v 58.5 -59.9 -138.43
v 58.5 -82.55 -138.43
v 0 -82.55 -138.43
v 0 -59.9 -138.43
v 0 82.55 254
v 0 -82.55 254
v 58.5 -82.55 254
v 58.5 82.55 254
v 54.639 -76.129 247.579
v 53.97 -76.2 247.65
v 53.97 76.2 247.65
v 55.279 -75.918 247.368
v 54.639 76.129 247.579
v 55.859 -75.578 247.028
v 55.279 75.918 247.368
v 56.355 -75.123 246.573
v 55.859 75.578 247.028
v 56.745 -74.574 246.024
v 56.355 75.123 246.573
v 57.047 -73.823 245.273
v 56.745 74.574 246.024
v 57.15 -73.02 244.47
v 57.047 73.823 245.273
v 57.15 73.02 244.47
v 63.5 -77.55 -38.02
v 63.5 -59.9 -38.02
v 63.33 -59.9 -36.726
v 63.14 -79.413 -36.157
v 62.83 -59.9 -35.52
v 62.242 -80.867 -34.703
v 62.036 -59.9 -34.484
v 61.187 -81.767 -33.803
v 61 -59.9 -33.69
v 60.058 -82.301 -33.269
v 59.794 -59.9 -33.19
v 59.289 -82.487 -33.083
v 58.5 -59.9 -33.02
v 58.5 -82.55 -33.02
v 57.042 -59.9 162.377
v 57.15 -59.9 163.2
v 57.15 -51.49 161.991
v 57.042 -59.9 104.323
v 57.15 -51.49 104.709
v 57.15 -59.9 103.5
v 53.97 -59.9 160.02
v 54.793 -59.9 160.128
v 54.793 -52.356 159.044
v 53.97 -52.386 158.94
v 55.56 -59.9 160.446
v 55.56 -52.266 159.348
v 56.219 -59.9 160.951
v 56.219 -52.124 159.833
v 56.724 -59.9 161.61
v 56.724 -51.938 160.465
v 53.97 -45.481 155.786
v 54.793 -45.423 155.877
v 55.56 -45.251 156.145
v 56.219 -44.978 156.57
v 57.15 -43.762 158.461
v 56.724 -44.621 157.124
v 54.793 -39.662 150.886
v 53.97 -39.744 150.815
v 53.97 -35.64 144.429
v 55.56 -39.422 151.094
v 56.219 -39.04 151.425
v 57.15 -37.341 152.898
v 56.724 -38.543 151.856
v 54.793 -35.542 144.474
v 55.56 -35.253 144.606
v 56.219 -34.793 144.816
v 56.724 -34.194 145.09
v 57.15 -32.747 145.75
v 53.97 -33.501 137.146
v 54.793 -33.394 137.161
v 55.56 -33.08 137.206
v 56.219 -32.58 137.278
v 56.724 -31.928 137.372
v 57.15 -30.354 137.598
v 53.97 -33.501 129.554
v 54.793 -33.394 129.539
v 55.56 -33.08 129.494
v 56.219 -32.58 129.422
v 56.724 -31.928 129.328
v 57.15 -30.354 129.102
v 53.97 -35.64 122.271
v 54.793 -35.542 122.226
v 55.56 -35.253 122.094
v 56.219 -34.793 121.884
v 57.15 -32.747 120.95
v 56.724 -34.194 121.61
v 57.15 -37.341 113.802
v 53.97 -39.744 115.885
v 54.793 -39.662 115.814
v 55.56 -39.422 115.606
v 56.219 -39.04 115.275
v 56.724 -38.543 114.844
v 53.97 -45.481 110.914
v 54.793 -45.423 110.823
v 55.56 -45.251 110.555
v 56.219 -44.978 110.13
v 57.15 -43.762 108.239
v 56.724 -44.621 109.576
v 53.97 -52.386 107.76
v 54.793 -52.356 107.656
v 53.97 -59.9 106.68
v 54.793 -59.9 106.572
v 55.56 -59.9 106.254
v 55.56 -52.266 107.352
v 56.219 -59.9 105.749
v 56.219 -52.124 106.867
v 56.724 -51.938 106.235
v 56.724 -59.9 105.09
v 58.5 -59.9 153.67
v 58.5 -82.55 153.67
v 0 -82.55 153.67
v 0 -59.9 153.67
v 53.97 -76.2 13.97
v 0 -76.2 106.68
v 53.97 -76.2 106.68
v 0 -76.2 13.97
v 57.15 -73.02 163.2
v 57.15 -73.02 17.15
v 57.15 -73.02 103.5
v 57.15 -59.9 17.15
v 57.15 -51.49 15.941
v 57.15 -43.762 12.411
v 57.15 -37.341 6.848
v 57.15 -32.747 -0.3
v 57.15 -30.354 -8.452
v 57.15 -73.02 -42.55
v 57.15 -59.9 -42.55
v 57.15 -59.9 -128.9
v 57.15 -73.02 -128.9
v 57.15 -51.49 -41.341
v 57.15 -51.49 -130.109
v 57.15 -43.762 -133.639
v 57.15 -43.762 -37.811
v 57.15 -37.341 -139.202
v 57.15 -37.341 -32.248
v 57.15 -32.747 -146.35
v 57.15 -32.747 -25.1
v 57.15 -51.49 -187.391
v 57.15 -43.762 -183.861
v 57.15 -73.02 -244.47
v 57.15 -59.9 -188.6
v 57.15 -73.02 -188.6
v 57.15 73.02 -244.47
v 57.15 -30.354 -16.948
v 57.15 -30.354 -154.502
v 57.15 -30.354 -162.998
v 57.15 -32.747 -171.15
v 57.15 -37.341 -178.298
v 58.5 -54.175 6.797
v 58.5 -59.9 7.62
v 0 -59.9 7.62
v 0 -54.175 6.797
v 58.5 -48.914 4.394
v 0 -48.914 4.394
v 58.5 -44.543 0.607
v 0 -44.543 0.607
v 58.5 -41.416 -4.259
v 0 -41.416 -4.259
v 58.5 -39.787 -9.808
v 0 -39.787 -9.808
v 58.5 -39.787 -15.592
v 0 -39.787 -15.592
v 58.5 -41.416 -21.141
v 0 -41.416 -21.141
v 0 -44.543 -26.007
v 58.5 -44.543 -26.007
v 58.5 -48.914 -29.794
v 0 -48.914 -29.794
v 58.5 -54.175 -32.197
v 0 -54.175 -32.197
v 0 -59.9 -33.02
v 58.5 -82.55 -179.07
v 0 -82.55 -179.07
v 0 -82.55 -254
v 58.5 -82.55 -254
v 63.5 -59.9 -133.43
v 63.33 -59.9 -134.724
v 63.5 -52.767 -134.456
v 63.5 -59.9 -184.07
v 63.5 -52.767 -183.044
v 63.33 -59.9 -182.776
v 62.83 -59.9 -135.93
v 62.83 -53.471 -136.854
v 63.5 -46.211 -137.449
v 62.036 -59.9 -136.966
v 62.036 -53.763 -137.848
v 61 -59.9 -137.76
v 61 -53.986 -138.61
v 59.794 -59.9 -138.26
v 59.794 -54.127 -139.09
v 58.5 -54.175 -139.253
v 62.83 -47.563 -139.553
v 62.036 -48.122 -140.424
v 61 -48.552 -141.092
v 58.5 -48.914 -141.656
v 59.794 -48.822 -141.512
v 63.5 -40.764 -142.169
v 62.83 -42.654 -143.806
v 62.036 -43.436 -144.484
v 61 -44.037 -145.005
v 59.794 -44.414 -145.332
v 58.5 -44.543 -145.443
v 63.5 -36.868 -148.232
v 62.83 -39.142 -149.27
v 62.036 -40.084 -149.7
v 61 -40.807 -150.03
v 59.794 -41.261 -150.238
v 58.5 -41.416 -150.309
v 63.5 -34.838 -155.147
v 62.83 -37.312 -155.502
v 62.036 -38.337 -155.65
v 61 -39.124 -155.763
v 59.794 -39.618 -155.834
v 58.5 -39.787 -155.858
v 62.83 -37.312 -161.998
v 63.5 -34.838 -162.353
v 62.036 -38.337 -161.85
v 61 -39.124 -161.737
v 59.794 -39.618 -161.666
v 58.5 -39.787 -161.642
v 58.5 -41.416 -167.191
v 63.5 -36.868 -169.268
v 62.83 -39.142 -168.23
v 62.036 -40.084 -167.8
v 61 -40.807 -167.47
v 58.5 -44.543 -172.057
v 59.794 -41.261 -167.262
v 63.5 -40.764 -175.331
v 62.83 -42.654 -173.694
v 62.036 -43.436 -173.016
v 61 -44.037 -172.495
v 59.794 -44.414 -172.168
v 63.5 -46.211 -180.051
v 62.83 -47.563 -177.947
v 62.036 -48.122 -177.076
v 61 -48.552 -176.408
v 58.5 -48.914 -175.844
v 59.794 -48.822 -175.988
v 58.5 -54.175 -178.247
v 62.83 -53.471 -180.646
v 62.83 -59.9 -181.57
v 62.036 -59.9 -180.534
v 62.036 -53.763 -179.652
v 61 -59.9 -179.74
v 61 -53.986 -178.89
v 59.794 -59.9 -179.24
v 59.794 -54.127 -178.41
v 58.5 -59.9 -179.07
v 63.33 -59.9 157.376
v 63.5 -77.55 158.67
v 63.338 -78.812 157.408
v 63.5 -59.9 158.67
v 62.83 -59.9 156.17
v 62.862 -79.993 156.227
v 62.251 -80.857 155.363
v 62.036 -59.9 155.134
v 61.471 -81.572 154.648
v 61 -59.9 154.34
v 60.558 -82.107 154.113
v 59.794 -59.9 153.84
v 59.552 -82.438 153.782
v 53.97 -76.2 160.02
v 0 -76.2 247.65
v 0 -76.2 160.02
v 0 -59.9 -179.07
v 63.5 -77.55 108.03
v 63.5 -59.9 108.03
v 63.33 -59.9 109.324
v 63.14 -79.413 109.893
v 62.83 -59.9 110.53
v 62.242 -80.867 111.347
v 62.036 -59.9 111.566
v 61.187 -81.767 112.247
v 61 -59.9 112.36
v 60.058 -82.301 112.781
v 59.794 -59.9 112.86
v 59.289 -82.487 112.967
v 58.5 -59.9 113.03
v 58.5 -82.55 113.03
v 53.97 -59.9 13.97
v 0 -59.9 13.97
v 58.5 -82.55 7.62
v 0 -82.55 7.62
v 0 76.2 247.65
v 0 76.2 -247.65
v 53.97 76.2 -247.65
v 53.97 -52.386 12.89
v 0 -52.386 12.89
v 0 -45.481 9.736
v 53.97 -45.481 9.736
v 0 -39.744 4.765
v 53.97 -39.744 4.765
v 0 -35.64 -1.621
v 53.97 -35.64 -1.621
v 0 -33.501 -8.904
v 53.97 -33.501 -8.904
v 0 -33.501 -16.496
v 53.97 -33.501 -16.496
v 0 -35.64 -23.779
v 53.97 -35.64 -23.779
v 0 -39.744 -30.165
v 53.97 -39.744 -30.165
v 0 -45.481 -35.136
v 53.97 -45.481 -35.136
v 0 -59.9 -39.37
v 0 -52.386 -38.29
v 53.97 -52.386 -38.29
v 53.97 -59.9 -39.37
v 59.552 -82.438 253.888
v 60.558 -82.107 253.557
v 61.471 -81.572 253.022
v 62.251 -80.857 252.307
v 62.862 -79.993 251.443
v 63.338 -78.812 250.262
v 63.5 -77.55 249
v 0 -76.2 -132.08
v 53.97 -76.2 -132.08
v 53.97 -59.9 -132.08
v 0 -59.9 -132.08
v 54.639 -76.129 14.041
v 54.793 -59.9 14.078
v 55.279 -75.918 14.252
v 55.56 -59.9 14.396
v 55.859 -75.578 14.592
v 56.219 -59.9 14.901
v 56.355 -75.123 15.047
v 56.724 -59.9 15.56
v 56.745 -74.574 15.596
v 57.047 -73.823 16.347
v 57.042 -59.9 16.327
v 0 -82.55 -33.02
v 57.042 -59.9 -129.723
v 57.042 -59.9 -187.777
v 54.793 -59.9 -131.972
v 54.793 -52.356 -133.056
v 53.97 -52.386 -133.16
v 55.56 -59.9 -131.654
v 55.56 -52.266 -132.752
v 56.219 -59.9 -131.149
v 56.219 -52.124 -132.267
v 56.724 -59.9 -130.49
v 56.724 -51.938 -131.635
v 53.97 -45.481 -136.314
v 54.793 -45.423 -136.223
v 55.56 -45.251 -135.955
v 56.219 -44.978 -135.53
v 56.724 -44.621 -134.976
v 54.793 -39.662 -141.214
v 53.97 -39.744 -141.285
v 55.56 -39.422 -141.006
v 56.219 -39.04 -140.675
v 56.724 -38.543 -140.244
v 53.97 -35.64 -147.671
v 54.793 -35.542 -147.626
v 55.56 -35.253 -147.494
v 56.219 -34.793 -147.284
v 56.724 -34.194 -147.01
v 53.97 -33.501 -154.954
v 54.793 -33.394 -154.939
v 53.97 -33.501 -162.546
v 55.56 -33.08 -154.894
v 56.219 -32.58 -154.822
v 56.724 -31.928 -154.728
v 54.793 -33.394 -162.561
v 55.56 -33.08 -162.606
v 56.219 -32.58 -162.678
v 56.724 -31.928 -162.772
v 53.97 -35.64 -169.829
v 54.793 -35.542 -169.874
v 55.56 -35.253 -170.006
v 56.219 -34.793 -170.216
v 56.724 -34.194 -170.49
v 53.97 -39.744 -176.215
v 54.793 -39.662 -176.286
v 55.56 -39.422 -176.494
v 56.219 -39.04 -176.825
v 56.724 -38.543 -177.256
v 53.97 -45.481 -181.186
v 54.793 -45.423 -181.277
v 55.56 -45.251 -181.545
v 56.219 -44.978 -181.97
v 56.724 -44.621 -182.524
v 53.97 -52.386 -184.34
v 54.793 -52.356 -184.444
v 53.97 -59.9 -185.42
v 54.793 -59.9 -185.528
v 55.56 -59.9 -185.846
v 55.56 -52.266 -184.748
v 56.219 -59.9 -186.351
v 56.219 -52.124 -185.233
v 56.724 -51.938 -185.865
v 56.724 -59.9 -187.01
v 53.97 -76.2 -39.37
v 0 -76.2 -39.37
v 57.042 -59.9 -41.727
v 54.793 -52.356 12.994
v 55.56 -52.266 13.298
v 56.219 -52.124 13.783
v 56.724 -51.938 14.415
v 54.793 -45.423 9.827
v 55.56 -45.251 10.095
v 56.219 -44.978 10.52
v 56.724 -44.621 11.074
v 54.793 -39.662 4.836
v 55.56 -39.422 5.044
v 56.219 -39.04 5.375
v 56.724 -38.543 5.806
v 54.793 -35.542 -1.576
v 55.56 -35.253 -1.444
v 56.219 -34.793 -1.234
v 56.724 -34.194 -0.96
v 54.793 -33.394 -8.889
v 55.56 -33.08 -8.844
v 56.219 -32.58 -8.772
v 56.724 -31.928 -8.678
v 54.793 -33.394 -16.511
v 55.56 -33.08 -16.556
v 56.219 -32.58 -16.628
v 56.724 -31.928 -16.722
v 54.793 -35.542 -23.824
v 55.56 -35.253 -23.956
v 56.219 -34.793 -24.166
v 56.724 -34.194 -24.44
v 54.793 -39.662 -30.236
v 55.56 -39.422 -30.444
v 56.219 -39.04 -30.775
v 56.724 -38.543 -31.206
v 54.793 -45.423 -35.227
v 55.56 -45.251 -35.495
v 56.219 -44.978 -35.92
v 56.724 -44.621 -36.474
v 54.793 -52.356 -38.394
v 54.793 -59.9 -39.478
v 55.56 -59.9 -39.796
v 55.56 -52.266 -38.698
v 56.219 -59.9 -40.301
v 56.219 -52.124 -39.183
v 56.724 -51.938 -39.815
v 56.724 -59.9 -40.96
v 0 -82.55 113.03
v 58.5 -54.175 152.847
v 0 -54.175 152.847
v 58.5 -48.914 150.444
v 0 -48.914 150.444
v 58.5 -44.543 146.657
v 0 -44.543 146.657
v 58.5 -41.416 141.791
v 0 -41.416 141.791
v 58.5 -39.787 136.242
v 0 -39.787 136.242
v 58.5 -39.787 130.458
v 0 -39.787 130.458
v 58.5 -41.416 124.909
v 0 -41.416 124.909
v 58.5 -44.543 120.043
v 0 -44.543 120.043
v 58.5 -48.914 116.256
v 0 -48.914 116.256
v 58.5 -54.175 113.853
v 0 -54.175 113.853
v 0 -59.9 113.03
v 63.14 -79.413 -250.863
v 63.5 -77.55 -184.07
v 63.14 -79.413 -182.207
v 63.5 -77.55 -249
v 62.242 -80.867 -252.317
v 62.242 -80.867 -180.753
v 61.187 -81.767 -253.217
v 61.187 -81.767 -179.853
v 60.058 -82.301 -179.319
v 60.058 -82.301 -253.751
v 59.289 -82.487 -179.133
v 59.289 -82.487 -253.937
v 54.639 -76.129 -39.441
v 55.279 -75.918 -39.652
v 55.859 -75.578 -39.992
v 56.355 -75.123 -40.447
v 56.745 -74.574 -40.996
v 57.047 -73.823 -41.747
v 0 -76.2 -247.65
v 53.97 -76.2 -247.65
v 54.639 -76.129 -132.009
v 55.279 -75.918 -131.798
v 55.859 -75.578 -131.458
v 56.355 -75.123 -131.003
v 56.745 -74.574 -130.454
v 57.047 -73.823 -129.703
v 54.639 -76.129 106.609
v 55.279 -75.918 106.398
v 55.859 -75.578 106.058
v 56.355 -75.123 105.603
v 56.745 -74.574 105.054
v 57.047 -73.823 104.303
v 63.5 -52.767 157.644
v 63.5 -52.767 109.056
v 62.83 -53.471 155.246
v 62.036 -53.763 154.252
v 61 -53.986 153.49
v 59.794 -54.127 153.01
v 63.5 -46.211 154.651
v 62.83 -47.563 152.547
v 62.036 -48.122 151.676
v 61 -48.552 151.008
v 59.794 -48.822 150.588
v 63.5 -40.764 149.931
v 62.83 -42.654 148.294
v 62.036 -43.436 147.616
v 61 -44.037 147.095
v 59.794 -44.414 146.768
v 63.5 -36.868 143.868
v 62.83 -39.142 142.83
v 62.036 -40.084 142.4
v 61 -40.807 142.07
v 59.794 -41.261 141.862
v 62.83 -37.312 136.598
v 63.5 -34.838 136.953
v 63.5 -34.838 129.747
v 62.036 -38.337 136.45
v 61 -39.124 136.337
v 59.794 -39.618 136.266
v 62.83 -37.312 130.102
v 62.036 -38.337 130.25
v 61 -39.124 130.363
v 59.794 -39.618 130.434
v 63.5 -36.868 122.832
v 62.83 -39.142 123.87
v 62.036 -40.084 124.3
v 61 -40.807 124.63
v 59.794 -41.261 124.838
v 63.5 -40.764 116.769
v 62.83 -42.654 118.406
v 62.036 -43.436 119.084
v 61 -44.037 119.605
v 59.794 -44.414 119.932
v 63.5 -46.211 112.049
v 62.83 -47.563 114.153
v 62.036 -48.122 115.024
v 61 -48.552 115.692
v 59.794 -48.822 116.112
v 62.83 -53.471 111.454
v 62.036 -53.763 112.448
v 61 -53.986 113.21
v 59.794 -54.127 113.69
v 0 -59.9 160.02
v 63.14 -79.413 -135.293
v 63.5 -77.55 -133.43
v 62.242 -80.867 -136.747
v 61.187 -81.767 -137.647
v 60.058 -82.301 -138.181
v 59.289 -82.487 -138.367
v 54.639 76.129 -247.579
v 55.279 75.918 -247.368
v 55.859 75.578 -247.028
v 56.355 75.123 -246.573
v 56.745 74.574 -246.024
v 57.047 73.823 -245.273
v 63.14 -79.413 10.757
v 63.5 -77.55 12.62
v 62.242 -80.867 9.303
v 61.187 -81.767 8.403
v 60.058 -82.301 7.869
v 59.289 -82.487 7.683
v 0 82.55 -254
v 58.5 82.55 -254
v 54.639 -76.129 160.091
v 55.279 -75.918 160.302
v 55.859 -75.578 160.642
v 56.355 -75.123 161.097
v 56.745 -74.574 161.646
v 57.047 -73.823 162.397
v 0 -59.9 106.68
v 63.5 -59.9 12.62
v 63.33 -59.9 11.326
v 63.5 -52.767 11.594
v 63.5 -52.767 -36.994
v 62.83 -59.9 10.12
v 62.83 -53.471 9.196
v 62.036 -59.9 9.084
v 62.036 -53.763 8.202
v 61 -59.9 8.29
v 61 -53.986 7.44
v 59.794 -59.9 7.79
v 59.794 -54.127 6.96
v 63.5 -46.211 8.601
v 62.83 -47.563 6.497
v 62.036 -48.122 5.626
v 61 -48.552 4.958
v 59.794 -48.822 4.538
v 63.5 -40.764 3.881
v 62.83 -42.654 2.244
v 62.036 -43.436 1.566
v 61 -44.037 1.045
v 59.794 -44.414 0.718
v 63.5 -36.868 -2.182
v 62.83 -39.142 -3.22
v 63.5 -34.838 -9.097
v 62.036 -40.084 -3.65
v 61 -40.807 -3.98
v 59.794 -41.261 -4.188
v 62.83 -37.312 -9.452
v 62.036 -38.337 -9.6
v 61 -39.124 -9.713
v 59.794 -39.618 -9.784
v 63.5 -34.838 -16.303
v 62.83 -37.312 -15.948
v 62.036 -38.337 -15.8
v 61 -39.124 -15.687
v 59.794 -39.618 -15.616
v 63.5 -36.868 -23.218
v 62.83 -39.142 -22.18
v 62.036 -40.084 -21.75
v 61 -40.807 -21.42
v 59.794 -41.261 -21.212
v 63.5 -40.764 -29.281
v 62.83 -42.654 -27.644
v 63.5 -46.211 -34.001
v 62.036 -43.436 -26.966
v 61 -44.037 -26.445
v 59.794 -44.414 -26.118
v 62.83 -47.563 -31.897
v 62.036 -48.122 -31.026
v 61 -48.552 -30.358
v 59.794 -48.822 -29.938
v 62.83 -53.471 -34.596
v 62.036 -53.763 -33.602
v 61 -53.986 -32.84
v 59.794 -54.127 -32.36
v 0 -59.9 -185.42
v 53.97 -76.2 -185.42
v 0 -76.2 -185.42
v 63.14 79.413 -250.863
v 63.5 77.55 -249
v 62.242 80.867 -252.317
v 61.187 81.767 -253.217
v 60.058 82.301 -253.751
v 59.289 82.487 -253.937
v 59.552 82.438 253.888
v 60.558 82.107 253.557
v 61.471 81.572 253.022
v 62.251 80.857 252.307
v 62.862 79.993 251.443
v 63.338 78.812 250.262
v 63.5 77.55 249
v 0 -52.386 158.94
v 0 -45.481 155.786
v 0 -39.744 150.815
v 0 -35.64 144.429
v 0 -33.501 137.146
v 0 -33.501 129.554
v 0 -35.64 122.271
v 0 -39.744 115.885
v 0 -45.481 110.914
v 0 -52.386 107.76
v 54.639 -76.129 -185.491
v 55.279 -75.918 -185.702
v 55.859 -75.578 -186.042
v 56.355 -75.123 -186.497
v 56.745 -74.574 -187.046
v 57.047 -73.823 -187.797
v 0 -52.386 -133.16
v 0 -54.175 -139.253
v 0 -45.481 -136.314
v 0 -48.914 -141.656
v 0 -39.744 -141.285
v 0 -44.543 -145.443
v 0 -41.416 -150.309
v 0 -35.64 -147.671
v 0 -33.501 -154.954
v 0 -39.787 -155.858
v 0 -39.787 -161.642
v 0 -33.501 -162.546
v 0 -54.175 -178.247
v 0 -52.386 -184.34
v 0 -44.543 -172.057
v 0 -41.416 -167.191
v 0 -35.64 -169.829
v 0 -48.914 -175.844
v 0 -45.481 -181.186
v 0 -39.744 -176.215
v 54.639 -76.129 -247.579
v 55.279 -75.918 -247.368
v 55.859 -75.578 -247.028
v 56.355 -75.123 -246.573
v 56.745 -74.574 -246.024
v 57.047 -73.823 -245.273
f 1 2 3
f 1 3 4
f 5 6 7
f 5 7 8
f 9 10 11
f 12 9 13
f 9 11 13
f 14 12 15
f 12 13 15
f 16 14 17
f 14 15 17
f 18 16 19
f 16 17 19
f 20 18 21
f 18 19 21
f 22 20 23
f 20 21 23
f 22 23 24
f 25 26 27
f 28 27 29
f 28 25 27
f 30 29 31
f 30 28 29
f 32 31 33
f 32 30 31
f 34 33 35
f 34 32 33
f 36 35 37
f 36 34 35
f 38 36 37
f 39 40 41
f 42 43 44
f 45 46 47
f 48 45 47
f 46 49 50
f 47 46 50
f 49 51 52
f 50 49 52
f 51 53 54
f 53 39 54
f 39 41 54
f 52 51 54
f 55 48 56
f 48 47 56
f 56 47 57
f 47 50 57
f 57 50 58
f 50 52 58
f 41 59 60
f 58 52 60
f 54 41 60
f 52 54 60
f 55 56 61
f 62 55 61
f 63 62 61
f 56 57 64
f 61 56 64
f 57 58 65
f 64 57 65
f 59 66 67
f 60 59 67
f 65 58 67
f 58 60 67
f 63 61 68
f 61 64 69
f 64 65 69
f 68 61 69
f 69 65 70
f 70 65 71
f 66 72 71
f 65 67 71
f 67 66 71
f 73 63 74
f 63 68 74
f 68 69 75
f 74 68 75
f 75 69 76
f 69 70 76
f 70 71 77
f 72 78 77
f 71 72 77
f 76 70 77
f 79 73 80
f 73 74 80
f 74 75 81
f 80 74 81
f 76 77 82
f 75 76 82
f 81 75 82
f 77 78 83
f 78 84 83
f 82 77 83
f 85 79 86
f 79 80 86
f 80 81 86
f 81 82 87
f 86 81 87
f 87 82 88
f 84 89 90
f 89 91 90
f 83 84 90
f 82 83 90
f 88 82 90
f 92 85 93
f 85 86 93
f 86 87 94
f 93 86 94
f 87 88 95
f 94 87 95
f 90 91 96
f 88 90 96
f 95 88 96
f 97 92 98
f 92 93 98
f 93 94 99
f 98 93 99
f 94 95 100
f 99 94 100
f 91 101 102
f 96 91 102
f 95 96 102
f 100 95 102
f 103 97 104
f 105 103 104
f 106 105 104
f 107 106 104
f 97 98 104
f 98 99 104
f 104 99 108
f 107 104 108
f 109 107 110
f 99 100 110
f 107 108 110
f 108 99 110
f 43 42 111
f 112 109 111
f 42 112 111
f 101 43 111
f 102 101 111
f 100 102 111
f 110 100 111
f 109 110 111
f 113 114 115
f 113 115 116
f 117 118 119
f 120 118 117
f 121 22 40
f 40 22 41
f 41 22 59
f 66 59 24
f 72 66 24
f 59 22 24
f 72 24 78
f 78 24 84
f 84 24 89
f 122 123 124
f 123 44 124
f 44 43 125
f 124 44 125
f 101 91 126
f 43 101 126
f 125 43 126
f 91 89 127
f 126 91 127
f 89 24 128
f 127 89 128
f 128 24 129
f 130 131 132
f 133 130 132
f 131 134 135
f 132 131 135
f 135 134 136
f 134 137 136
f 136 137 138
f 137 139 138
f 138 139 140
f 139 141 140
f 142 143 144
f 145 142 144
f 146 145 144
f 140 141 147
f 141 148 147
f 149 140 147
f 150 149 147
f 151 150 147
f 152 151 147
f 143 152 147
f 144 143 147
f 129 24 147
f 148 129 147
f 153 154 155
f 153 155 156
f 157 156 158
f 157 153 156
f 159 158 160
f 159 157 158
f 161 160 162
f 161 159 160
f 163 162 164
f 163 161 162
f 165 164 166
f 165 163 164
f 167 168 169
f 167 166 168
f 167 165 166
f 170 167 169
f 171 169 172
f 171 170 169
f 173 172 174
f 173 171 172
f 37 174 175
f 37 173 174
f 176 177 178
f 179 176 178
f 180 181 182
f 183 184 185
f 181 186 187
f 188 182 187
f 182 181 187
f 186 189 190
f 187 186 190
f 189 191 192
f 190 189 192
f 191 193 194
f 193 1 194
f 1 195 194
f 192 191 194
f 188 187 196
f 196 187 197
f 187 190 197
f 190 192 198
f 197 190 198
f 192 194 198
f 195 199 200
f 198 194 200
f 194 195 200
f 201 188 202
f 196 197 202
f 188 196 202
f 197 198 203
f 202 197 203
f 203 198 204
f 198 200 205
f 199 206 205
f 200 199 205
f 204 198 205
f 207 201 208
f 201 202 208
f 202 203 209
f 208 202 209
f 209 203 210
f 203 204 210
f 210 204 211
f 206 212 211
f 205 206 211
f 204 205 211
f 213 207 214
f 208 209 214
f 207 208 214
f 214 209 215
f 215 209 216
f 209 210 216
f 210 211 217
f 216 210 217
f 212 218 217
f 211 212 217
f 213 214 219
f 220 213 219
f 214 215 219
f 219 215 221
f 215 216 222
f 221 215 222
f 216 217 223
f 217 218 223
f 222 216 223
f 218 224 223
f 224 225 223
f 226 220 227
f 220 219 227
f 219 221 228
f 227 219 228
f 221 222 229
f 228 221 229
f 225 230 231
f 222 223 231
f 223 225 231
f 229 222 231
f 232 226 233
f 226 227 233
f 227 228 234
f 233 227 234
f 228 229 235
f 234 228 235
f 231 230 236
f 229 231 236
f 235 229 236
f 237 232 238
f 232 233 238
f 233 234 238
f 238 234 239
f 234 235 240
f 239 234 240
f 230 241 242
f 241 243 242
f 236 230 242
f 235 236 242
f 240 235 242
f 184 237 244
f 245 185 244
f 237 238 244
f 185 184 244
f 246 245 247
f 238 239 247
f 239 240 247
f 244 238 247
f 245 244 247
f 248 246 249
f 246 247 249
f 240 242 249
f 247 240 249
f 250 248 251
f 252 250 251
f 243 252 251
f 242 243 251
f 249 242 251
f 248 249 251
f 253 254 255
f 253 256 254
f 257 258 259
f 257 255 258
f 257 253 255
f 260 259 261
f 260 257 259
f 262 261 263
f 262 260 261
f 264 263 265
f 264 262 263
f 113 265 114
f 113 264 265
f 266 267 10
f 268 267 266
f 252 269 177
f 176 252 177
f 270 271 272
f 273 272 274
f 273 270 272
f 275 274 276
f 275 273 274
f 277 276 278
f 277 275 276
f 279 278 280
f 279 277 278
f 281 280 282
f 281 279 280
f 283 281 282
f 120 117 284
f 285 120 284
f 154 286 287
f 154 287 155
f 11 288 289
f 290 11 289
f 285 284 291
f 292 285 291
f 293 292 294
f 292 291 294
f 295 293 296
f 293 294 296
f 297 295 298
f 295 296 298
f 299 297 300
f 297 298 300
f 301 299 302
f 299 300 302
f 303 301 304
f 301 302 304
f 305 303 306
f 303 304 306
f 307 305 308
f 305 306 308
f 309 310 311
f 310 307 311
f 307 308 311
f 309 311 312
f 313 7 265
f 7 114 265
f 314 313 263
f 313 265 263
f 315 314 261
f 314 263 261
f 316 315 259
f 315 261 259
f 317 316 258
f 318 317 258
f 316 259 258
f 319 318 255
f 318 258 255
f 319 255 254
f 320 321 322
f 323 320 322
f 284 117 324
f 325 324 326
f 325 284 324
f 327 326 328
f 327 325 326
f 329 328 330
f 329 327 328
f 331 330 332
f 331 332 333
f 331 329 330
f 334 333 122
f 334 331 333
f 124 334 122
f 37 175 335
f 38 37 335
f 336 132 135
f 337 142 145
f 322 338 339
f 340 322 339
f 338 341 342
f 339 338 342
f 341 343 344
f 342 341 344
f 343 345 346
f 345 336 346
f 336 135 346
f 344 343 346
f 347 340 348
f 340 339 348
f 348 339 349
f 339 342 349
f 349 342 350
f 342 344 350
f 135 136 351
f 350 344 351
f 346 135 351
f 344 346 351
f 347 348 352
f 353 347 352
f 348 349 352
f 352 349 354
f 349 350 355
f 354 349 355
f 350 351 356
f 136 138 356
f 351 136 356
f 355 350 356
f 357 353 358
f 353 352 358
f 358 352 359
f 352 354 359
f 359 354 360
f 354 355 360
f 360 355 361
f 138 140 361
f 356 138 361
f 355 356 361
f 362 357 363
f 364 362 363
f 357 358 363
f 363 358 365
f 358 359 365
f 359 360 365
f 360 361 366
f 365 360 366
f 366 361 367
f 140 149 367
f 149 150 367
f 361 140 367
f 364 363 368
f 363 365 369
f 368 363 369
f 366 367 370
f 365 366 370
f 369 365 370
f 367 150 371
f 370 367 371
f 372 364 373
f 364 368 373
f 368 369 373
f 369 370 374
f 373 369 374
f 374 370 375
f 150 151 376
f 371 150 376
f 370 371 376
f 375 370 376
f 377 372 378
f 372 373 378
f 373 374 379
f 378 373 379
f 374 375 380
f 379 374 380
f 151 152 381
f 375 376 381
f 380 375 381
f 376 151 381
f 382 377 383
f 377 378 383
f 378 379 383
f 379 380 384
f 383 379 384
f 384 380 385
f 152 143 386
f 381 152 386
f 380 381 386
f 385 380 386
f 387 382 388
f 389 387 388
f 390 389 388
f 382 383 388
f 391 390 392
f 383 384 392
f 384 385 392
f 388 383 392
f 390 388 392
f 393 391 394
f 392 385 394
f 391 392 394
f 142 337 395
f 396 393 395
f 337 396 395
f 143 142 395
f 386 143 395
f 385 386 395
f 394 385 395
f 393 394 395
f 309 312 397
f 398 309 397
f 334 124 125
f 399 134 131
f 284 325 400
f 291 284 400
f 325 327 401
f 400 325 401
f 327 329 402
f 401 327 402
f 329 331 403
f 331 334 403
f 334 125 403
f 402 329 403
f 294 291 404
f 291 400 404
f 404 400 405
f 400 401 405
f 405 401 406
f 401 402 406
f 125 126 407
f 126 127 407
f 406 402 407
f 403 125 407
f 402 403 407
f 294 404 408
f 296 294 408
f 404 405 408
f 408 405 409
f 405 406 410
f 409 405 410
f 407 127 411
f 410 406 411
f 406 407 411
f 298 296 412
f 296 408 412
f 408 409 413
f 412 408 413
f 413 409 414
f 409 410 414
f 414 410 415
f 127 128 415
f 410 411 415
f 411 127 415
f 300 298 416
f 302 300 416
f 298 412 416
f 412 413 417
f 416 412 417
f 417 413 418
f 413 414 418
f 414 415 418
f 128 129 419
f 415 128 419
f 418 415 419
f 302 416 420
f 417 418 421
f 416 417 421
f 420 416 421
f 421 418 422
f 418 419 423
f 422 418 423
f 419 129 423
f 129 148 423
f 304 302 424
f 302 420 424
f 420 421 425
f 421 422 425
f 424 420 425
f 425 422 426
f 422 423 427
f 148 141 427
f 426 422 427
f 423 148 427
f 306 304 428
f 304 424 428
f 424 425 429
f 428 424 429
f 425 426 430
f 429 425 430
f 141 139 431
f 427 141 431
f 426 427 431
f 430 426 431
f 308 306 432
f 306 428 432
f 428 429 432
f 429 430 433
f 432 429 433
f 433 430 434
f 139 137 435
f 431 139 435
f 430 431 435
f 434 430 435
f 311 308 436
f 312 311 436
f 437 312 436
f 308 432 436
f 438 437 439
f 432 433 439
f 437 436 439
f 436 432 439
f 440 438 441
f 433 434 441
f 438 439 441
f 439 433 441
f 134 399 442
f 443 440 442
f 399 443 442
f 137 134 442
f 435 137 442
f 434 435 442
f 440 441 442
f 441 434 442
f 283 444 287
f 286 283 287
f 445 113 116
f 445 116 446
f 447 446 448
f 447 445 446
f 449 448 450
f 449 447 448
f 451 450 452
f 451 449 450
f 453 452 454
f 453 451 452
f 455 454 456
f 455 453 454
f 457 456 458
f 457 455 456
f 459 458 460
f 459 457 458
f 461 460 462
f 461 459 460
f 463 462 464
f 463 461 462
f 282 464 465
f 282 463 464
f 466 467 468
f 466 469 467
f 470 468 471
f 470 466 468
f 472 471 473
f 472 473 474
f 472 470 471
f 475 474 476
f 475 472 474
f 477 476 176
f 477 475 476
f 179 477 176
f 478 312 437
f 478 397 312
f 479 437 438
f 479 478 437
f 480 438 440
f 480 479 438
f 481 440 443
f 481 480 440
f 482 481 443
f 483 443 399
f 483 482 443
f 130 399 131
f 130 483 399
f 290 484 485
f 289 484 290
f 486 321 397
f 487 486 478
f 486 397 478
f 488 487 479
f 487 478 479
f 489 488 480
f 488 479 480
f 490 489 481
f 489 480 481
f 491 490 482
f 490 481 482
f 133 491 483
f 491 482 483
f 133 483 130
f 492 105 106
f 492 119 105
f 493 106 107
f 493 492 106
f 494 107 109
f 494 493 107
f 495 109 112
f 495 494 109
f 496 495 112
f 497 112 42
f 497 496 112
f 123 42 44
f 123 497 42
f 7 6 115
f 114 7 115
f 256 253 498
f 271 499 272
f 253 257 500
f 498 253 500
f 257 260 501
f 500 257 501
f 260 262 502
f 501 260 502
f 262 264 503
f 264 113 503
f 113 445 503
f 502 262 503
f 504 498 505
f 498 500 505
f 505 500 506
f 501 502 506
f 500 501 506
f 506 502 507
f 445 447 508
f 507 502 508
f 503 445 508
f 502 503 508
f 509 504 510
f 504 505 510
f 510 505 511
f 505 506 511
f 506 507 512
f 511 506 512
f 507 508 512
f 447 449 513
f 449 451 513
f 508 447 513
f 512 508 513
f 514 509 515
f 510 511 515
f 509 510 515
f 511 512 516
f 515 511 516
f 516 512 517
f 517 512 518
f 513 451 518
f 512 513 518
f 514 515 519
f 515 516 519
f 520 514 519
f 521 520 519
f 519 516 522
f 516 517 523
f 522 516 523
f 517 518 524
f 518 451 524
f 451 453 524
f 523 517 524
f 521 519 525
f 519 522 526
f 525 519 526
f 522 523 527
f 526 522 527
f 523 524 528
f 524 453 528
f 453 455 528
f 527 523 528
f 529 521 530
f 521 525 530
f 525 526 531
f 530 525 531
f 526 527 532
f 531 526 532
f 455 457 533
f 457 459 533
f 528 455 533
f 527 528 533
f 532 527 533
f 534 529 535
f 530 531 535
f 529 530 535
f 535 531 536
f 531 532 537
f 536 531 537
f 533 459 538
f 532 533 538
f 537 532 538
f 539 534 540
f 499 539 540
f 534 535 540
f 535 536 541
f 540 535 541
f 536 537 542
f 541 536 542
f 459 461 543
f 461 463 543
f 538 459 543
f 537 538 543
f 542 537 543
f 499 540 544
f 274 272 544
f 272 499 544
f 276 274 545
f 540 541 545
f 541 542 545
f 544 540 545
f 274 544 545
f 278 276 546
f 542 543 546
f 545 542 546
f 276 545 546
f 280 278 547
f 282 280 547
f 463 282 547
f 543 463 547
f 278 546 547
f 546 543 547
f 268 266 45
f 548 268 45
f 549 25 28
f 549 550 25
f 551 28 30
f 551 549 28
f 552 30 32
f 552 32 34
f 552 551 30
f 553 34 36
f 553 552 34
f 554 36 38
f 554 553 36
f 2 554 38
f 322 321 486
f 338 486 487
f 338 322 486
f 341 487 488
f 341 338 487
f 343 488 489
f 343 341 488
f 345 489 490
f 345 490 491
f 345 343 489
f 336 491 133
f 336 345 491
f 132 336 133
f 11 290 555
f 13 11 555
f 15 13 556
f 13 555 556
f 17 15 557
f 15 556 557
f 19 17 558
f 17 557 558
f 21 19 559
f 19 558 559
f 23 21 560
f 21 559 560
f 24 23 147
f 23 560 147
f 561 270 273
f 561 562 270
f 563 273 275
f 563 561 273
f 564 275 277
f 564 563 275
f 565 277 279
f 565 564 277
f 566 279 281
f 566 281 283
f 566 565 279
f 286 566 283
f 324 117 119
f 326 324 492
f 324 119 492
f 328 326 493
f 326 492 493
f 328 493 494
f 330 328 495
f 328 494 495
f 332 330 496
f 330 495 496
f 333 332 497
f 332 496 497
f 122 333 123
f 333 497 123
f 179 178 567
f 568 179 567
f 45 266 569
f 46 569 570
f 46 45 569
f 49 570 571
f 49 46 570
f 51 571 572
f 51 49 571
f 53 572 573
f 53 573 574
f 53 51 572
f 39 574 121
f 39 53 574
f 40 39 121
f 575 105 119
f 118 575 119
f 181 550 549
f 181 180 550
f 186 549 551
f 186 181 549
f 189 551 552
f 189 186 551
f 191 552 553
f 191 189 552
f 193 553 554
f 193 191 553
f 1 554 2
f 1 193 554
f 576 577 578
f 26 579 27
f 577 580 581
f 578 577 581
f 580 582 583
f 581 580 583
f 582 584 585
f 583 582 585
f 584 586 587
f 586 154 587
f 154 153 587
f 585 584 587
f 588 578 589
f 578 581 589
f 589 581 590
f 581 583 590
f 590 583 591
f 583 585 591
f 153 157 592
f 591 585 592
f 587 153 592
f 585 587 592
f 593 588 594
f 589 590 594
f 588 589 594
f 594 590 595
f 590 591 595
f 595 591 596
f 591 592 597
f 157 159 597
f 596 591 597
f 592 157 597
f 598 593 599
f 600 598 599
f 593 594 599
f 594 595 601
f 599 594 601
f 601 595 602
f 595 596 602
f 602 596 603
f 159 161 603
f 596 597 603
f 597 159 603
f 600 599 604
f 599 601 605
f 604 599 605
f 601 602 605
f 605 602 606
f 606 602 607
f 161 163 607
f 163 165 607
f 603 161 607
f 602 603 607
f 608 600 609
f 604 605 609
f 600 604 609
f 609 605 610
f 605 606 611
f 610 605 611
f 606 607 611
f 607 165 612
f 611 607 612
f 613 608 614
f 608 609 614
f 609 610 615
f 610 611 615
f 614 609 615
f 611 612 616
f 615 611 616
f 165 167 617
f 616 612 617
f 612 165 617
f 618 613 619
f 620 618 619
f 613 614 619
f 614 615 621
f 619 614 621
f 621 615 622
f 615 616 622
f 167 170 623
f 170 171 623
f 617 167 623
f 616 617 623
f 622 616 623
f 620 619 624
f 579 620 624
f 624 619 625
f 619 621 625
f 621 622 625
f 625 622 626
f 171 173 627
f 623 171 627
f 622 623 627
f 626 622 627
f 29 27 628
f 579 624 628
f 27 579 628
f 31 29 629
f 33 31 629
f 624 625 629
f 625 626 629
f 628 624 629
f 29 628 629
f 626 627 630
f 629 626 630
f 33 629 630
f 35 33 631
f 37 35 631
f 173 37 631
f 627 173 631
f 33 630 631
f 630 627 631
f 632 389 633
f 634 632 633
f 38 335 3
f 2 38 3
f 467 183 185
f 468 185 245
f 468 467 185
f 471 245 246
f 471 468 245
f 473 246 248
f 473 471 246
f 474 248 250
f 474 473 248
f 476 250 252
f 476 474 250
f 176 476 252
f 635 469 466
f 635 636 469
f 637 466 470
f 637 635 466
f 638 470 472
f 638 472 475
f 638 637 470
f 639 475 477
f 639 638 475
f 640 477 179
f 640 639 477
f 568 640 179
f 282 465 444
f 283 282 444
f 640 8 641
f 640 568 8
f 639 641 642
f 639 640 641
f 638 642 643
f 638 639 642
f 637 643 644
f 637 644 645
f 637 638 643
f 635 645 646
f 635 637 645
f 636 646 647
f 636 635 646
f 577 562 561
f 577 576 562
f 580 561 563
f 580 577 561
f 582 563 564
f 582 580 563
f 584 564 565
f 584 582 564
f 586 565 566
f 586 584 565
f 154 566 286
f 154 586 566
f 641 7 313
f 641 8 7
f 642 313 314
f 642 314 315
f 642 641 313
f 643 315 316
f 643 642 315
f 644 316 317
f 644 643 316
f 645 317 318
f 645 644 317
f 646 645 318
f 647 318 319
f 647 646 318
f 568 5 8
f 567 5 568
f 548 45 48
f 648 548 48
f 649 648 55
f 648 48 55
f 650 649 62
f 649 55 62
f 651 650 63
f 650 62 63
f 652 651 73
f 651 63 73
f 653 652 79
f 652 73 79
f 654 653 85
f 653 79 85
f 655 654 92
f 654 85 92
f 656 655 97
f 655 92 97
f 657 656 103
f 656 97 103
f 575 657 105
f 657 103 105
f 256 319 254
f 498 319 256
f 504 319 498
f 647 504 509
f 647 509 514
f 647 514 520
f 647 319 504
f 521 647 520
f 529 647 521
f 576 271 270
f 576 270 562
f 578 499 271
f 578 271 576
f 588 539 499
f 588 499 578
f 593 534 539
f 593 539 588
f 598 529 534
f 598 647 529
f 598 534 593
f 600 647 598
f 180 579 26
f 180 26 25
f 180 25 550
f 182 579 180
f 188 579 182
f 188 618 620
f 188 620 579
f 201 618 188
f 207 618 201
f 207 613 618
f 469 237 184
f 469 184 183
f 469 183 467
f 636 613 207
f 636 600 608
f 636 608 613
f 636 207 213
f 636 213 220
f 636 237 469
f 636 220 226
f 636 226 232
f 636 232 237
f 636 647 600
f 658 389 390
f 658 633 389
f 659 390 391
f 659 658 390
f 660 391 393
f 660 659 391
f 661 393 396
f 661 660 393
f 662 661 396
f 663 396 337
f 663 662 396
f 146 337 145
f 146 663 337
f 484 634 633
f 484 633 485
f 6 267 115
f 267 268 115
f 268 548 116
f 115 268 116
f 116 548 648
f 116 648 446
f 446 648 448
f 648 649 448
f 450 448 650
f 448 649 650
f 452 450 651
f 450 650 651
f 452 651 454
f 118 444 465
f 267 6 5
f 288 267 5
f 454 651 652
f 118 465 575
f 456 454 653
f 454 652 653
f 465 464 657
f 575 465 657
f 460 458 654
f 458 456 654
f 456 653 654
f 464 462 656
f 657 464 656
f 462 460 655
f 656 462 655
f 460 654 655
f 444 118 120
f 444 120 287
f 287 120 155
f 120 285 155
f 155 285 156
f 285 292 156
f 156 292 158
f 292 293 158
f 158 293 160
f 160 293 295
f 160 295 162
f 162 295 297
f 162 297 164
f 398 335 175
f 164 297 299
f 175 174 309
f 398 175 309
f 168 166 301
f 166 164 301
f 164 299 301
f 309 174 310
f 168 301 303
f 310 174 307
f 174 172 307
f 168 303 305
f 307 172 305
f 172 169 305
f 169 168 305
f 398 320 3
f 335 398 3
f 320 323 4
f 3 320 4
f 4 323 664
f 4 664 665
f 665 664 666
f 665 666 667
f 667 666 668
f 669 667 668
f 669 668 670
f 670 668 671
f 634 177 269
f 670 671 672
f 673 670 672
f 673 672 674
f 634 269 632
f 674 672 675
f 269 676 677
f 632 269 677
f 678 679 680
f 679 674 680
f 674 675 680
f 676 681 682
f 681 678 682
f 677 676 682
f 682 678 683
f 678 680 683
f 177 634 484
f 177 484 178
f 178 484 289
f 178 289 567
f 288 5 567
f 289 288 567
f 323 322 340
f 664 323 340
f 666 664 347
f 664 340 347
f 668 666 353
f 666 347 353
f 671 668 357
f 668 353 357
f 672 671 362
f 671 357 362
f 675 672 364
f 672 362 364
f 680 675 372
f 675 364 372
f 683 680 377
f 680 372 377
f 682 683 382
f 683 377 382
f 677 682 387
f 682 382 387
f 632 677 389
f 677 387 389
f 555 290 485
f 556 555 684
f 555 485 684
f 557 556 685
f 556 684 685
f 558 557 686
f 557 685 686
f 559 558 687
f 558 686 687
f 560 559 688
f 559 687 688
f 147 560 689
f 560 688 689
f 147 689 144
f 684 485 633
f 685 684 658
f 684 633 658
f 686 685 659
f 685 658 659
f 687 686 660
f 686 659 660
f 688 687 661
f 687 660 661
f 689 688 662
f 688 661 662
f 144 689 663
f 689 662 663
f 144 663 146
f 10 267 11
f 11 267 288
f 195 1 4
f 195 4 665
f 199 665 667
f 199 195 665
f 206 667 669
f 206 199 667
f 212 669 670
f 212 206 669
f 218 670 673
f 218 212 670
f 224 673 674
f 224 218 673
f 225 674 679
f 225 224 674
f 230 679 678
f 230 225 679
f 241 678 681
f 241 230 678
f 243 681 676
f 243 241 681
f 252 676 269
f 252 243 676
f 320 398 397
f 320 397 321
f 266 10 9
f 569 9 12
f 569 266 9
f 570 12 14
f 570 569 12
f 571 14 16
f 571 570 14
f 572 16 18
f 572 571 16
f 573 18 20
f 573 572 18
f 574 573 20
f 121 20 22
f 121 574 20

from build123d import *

# Parameters (mm, degrees)
SKETCH1_W           = 508
SKETCH1_H           = 165.1
BOSS_EXTRUDE2_DEPTH = 63.5
CUT_EXTRUDE2_DEPTH  = 275.522772279
SHELL1_T            = -6.35
FILLET1_R           = 5
FILLET2_R           = 3.18


with BuildPart() as part:
    # Sketch1 → Boss-Extrude2 (new body)
    with BuildSketch(Plane(origin=(0, 0, 0), x_dir=(0, 0, -1), z_dir=(1, 0, 0))):
        Rectangle(SKETCH1_W, SKETCH1_H)
    extrude(amount=BOSS_EXTRUDE2_DEPTH)

    # Sketch14 → Cut-Extrude2 (cut, through all)
    with BuildSketch(Plane(origin=(63.5, 0, 0), x_dir=(0, 0, -1), z_dir=(1, 0, 0))):
        with BuildLine():
            Line((-153.67, -82.55), (-153.67, -59.9))
            ThreePointArc((-153.67, -59.9), (-133.35, -39.58), (-113.03, -59.9))
            Line((-113.03, -59.9), (-113.03, -82.55))
            ThreePointArc((-113.03, -82.55), (-133.35, -102.87), (-153.67, -82.55))
        make_face()
        with BuildLine():
            Line((-7.62, -82.55), (-7.62, -59.9))
            ThreePointArc((-7.62, -59.9), (12.7, -39.58), (33.02, -59.9))
            Line((33.02, -59.9), (33.02, -82.55))
            ThreePointArc((33.02, -82.55), (12.7, -102.87), (-7.62, -82.55))
        make_face()
        with BuildLine():
            Line((138.43, -82.55), (138.43, -59.9))
            ThreePointArc((138.43, -59.9), (158.75, -39.58), (179.07, -59.9))
            Line((179.07, -59.9), (179.07, -82.55))
            ThreePointArc((179.07, -82.55), (158.75, -102.87), (138.43, -82.55))
        make_face()
    extrude(amount=-CUT_EXTRUDE2_DEPTH, mode=Mode.SUBTRACT)

    # Shell1
    shell1_openings = [part.faces().sort_by_distance(p)[0] for p in [
        (0, 3.74487295, 0.755170832),
    ]]
    offset(amount=SHELL1_T, openings=shell1_openings, kind=Kind.INTERSECTION)

    # Fillet1
    fillet1_edges = [part.edges().sort_by_distance(p)[0] for p in [
        (63.5, 0, 254),
        (63.5, -82.55, 203.835),
        (63.5, -82.55, 60.325),
        (63.5, -82.55, -85.725),
        (63.5, -82.55, -216.535),
        (63.5, -71.225, 153.67),
        (63.5, -71.225, 113.03),
        (63.5, -39.58, 133.35),
        (63.5, -71.225, 7.62),
        (63.5, -71.225, -33.02),
        (63.5, -39.58, -12.7),
        (63.5, -71.225, -138.43),
        (63.5, -71.225, -179.07),
        (63.5, -39.58, -158.75),
        (63.5, 0, -254),
        (63.5, 82.55, 0),
    ]]
    fillet(fillet1_edges, radius=FILLET1_R)

    # Fillet2
    fillet2_edges = [part.edges().sort_by_distance(p)[0] for p in [
        (57.15, -76.2, 60.325),
        (57.15, -76.2, -85.725),
        (57.15, -76.2, -216.535),
        (57.15, 0, -247.65),
        (57.15, 76.2, 0),
        (57.15, 0, 247.65),
        (57.15, -76.2, 203.835),
        (57.15, -68.05, -132.08),
        (57.15, -33.23, -158.75),
        (57.15, -68.05, -185.42),
        (57.15, -68.05, 13.97),
        (57.15, -33.23, -12.7),
        (57.15, -68.05, -39.37),
        (57.15, -68.05, 160.02),
        (57.15, -33.23, 133.35),
        (57.15, -68.05, 106.68),
    ]]
    fillet(fillet2_edges, radius=FILLET2_R)


solid = part.part
